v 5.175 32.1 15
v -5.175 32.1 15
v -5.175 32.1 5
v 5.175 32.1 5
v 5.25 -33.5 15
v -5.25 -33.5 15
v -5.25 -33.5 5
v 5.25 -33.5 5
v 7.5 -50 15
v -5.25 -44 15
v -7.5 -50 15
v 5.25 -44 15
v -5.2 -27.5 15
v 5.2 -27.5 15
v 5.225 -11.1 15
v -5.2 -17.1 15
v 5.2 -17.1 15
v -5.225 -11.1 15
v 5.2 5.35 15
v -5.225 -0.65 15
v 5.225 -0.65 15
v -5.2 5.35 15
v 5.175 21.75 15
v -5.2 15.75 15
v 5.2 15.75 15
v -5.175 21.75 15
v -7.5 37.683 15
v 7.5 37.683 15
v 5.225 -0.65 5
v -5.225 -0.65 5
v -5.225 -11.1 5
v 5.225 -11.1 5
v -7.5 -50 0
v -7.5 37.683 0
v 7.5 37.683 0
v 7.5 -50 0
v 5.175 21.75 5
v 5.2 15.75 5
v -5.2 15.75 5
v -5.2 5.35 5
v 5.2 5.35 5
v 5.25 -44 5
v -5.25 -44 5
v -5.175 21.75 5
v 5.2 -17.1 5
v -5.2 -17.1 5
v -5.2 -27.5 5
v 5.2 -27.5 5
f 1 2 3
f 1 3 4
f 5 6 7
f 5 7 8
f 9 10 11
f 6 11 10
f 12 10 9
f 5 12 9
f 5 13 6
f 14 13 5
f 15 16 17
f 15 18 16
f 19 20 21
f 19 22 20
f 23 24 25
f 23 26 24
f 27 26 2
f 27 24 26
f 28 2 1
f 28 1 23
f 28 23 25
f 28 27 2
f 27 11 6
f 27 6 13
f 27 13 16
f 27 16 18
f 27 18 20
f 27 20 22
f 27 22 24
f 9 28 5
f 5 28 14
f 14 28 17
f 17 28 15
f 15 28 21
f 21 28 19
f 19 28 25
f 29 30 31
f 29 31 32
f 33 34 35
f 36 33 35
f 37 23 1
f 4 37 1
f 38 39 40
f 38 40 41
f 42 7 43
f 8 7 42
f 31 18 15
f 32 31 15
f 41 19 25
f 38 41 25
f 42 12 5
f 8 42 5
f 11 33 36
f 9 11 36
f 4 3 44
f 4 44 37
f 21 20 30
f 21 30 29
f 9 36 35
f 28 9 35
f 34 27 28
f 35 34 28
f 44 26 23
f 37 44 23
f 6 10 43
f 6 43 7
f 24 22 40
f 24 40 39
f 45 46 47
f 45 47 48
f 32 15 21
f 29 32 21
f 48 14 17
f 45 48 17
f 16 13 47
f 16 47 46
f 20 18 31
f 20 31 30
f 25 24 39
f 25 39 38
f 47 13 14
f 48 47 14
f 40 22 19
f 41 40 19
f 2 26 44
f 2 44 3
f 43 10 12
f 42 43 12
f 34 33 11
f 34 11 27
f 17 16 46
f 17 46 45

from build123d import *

# Parameters (mm, degrees)
SKETCH_1_W          = 15
SKETCH_1_H          = 100
EXTRUDE_1_DEPTH     = 15
SKETCH_3_W          = 10.35
SKETCH_3_H          = 10.35
SKETCH_3_W_2        = 10.4
SKETCH_3_H_2        = 10.4
SKETCH_3_W_3        = 10.45
SKETCH_3_H_3        = 10.45
SKETCH_3_W_4        = 10.5
SKETCH_3_H_4        = 10.5
CUT_EXTRUDE_1_DEPTH = 10
SKETCH_4_W          = 15
SKETCH_4_H          = 12.316827503
CUT_EXTRUDE_2_DEPTH = 53.737557774


with BuildPart() as part:
    # 草图1 → 凸台-拉伸1 (new body)
    with BuildSketch(Plane.XY):
        Rectangle(SKETCH_1_W, SKETCH_1_H)
    extrude(amount=EXTRUDE_1_DEPTH)

    # 草图3 → 切除-拉伸1 (cut)
    with BuildSketch(Plane.XY.offset(15)):
        with Locations((0, 26.925)):
            Rectangle(SKETCH_3_W, SKETCH_3_H)
        with Locations((0, 10.55)):
            Rectangle(SKETCH_3_W_2, SKETCH_3_H_2)
        with Locations((0, -5.875)):
            Rectangle(SKETCH_3_W_3, SKETCH_3_H_3)
        with Locations((0, -22.3)):
            Rectangle(SKETCH_3_W_2, SKETCH_3_H_2)
        with Locations((0, -38.75)):
            Rectangle(SKETCH_3_W_4, SKETCH_3_H_4)
    extrude(amount=-CUT_EXTRUDE_1_DEPTH, mode=Mode.SUBTRACT)

    # 草图4 → 切除-拉伸2 (cut, through all)
    with BuildSketch(Plane.XY.offset(15)):
        with Locations((0, 43.841586249)):
            Rectangle(SKETCH_4_W, SKETCH_4_H)
    extrude(amount=-CUT_EXTRUDE_2_DEPTH, mode=Mode.SUBTRACT)


solid = part.part
